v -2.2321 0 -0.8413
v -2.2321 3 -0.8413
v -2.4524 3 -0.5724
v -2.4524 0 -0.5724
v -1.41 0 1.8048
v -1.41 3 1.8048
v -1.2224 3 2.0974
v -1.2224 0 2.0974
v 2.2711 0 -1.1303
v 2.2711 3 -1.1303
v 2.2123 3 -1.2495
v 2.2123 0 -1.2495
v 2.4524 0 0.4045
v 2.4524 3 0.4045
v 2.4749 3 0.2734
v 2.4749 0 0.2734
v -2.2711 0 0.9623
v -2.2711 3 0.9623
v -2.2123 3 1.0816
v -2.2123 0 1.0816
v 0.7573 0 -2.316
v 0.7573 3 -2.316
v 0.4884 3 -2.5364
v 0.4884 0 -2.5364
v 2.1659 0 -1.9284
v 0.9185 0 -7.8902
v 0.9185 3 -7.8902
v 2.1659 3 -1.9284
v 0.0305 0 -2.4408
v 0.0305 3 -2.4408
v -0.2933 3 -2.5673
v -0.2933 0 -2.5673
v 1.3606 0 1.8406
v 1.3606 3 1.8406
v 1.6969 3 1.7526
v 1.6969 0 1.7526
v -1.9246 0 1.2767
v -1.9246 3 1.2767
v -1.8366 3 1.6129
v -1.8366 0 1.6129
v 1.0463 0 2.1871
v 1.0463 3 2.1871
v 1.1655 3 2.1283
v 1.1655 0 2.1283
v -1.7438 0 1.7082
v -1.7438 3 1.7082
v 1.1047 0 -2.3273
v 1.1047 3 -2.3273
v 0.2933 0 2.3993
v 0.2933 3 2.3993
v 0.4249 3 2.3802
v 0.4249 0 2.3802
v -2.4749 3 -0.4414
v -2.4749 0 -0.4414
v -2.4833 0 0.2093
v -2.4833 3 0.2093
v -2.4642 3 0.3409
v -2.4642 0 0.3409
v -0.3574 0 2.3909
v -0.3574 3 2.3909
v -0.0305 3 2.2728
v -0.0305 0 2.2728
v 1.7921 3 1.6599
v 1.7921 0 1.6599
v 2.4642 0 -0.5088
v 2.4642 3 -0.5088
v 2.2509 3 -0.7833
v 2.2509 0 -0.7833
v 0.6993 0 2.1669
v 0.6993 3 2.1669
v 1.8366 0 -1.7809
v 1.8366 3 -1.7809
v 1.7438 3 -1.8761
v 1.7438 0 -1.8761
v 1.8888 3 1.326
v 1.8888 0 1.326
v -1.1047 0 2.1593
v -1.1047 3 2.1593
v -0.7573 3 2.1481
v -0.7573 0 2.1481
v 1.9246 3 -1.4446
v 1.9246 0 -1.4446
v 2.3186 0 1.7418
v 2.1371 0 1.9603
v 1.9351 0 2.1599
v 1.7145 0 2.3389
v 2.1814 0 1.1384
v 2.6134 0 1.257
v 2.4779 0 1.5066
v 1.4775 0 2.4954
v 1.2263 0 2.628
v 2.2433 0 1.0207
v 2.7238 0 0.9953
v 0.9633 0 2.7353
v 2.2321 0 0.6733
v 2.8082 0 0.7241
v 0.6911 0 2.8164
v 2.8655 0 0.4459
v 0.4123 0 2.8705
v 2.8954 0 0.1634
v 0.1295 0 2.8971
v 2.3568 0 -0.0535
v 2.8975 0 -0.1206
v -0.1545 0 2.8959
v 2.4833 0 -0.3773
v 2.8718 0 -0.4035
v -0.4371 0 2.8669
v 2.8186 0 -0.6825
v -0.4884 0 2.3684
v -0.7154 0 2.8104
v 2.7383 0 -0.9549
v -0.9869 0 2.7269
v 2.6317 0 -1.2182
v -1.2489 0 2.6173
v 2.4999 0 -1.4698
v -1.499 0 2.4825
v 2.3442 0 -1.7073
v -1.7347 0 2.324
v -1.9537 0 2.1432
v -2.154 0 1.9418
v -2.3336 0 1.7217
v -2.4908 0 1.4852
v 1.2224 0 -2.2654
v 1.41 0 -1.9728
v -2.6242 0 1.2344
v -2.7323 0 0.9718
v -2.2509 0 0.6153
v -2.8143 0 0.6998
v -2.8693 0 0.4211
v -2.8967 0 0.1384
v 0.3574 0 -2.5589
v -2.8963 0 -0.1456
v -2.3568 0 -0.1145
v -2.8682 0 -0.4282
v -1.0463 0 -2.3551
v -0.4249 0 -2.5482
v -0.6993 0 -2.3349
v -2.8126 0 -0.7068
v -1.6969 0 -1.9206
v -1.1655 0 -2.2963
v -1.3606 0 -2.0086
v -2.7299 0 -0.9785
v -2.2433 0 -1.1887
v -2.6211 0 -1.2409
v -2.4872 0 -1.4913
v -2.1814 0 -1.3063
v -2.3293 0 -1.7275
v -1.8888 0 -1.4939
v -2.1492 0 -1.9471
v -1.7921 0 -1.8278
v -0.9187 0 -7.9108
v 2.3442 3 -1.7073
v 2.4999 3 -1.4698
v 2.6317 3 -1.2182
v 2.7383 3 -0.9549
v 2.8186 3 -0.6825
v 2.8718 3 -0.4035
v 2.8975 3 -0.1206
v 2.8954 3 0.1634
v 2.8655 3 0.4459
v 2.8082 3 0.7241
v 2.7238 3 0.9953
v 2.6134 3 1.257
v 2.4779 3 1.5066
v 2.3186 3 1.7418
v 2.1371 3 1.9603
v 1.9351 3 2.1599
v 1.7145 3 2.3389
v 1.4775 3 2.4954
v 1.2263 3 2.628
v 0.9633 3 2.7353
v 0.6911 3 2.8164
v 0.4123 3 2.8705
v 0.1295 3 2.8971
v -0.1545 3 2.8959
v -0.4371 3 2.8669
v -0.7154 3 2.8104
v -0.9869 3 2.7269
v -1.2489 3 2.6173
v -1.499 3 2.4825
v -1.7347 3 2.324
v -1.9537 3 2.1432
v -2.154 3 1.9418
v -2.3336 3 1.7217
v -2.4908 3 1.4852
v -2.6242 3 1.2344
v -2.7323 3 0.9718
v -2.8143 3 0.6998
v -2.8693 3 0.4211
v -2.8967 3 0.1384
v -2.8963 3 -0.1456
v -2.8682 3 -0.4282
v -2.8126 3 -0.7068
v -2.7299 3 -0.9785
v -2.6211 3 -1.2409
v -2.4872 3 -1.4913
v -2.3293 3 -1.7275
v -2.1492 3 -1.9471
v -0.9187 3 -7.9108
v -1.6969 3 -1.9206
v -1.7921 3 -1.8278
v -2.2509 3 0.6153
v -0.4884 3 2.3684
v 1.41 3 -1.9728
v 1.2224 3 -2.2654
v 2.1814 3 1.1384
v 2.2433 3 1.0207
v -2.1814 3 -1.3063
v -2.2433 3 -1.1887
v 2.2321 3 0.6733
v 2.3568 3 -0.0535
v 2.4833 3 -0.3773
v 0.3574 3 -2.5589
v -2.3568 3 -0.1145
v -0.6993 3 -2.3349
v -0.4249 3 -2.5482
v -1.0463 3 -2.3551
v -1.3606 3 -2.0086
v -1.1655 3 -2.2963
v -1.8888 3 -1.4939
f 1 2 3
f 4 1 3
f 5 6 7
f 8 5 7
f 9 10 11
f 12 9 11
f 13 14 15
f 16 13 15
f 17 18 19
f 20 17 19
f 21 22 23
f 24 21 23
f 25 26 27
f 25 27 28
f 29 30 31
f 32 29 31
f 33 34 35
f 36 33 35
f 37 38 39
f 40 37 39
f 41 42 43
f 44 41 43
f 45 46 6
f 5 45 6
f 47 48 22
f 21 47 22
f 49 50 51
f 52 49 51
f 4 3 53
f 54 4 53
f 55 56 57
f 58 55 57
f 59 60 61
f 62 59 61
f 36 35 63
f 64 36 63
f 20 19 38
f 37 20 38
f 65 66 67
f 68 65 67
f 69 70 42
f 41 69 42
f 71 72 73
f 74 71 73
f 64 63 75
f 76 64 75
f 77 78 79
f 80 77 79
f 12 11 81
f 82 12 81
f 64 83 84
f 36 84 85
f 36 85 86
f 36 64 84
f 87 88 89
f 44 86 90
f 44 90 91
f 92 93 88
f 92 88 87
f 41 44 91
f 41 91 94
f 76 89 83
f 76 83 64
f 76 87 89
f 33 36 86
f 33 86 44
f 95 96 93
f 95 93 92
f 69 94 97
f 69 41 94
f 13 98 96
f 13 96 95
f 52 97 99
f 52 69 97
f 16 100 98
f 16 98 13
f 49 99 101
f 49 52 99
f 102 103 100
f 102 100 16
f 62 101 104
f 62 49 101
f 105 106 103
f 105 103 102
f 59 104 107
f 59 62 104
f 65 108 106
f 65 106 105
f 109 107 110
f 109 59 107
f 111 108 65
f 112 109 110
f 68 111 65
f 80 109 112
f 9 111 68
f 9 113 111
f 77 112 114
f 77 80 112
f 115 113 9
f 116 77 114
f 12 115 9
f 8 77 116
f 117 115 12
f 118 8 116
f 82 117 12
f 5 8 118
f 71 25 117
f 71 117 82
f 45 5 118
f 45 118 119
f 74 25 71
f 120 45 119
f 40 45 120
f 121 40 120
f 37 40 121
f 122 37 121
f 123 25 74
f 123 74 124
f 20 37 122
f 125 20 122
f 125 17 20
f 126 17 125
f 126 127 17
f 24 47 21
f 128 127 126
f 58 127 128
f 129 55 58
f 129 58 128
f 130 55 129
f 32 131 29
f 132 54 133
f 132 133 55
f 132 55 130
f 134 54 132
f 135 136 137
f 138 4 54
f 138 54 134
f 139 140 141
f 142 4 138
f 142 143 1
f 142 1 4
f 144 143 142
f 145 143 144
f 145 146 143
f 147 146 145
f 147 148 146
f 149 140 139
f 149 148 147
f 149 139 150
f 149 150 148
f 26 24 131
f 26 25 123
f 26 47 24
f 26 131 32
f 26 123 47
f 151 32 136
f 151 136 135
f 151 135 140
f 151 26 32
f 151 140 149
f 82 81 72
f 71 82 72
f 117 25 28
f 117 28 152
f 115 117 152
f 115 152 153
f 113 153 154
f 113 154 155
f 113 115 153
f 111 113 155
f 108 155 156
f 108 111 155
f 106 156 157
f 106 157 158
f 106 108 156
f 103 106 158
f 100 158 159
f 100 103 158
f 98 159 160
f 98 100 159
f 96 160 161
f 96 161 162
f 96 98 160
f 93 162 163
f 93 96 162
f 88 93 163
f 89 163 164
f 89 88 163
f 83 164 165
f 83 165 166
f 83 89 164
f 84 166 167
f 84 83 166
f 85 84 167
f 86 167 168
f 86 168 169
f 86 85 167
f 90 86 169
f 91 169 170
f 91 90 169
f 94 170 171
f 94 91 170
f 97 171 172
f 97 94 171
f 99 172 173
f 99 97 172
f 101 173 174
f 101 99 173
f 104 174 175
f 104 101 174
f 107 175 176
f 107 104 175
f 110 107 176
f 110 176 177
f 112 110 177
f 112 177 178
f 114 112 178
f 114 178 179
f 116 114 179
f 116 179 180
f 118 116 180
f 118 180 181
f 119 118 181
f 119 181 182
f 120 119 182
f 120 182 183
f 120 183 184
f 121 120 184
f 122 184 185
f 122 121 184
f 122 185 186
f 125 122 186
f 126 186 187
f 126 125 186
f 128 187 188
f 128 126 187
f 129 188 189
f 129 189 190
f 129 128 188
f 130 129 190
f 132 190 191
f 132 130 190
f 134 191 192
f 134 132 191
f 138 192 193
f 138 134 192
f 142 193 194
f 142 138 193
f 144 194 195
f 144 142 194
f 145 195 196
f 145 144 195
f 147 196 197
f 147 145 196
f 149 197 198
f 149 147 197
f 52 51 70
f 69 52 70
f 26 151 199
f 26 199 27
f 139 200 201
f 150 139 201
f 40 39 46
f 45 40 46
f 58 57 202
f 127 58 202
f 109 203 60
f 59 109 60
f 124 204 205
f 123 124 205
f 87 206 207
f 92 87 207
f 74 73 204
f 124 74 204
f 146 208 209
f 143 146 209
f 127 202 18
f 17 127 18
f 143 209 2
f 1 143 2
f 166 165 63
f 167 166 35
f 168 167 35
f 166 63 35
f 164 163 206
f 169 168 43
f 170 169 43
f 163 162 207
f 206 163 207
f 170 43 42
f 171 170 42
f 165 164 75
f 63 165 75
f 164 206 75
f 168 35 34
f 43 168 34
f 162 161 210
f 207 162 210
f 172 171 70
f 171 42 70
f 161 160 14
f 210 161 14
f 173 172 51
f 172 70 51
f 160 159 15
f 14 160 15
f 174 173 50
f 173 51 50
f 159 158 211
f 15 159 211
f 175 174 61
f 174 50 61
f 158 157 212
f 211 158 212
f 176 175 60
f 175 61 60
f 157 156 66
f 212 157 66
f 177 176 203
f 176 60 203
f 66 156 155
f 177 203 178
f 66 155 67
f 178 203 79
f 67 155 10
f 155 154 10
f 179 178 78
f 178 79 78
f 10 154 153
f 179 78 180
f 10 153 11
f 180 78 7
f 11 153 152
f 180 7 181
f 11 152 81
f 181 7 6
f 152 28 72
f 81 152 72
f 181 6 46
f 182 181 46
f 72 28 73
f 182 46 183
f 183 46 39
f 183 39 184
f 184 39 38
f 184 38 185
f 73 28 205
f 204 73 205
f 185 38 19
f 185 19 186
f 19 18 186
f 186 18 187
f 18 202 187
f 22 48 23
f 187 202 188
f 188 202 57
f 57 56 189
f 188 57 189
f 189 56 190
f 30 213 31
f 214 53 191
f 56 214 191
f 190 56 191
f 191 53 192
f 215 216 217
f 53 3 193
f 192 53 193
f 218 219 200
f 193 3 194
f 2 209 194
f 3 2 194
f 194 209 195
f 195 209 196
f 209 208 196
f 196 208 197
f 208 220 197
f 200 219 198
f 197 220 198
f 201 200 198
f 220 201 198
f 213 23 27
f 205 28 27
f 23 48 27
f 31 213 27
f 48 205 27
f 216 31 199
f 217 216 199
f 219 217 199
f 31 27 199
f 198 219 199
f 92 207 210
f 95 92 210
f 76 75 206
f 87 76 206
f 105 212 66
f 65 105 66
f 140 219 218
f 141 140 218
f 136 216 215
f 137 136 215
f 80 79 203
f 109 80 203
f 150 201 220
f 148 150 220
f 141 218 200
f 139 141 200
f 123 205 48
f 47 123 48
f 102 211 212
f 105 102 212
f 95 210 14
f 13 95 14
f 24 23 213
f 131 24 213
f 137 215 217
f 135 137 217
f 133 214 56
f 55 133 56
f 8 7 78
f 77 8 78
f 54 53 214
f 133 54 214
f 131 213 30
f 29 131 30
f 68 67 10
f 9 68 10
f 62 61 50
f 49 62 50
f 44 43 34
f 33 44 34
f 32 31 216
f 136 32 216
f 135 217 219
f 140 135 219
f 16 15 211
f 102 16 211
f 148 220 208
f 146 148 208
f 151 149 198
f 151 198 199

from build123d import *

# Parameters (mm, degrees)
Y_KSEKLIK_EKSTR_ZYON1_DEPTH = 3
KES_EKSTR_ZYON1_DEPTH       = 3


with BuildPart() as part:
    # Çizim2 → Yükseklik-Ekstrüzyon1 (new body)
    with BuildSketch(Plane(origin=(0, 0, 0), x_dir=(1, 0, 0), z_dir=(0, 1, 0))):
        with BuildLine():
            Line((-2.149165658, 1.947071384), (-0.918653313, 7.910801403))
            Line((-0.918653313, 7.910801403), (0.918505018, 7.890194196))
            Line((0.918505018, 7.890194196), (2.165891081, 1.928449073))
            ThreePointArc((2.165891081, 1.928449073), (-0.012515293, -2.899972994), (-2.149165658, 1.947071384))
        make_face()
    extrude(amount=Y_KSEKLIK_EKSTR_ZYON1_DEPTH)

    # Çizim3 → Kes-Ekstrüzyon1 (cut)
    with BuildSketch(Plane(origin=(0, 3, -0.083225357), x_dir=(1, 0, 0), z_dir=(0, 1, 0))):
        Polygon((-1.696920921, 1.837383666), (-1.792135812, 1.744599792), (-1.88879277, 1.410713864), (-2.181417312, 1.223115215), (-2.243300262, 1.105449488), (-2.232050065, 0.758036458), (-2.452381372, 0.489193583), (-2.474874845, 0.358163944), (-2.356818742, 0.031231019), (-2.48328925, -0.292539866), (-2.464191429, -0.424107324), (-2.250885573, -0.69855767), (-2.271115468, -1.045563617), (-2.212295781, -1.164790154), (-1.924620035, -1.359892809), (-1.836629074, -1.696166458), (-1.743845201, -1.791381349), (-1.409959273, -1.888038307), (-1.222360623, -2.180662849), (-1.104694896, -2.242545799), (-0.757281866, -2.231295602), (-0.488438992, -2.451626909), (-0.357409352, -2.474120382), (-0.030476428, -2.356064279), (0.293294458, -2.482534787), (0.424861916, -2.463436966), (0.699312262, -2.25013111), (1.046318209, -2.270361005), (1.165544745, -2.211541317), (1.360647401, -1.923865572), (1.696921049, -1.835874611), (1.792135941, -1.743090737), (1.888792899, -1.409204809), (2.181417441, -1.22160616), (2.24330039, -1.103940433), (2.232050194, -0.756527403), (2.4523815, -0.487684528), (2.474874973, -0.356654889), (2.35681887, -0.029721965), (2.483289379, 0.294048921), (2.464191557, 0.425616379), (2.250885702, 0.700066725), (2.271115596, 1.047072672), (2.212295909, 1.166299208), (1.924620164, 1.361401864), (1.836629202, 1.697675512), (1.743845329, 1.792890404), (1.409959401, 1.889547362), (1.222360751, 2.182171904), (1.104695025, 2.244054853), (0.757281994, 2.232804657), (0.48843912, 2.453135964), (0.357409481, 2.475629437), (0.030476556, 2.357573334), (-0.29329433, 2.484043842), (-0.424861787, 2.464946021), (-0.699312133, 2.251640165), (-1.04631808, 2.27187006), (-1.165544617, 2.213050372), (-1.360647273, 1.925374627), align=None)
    extrude(amount=-KES_EKSTR_ZYON1_DEPTH, mode=Mode.SUBTRACT)


solid = part.part
